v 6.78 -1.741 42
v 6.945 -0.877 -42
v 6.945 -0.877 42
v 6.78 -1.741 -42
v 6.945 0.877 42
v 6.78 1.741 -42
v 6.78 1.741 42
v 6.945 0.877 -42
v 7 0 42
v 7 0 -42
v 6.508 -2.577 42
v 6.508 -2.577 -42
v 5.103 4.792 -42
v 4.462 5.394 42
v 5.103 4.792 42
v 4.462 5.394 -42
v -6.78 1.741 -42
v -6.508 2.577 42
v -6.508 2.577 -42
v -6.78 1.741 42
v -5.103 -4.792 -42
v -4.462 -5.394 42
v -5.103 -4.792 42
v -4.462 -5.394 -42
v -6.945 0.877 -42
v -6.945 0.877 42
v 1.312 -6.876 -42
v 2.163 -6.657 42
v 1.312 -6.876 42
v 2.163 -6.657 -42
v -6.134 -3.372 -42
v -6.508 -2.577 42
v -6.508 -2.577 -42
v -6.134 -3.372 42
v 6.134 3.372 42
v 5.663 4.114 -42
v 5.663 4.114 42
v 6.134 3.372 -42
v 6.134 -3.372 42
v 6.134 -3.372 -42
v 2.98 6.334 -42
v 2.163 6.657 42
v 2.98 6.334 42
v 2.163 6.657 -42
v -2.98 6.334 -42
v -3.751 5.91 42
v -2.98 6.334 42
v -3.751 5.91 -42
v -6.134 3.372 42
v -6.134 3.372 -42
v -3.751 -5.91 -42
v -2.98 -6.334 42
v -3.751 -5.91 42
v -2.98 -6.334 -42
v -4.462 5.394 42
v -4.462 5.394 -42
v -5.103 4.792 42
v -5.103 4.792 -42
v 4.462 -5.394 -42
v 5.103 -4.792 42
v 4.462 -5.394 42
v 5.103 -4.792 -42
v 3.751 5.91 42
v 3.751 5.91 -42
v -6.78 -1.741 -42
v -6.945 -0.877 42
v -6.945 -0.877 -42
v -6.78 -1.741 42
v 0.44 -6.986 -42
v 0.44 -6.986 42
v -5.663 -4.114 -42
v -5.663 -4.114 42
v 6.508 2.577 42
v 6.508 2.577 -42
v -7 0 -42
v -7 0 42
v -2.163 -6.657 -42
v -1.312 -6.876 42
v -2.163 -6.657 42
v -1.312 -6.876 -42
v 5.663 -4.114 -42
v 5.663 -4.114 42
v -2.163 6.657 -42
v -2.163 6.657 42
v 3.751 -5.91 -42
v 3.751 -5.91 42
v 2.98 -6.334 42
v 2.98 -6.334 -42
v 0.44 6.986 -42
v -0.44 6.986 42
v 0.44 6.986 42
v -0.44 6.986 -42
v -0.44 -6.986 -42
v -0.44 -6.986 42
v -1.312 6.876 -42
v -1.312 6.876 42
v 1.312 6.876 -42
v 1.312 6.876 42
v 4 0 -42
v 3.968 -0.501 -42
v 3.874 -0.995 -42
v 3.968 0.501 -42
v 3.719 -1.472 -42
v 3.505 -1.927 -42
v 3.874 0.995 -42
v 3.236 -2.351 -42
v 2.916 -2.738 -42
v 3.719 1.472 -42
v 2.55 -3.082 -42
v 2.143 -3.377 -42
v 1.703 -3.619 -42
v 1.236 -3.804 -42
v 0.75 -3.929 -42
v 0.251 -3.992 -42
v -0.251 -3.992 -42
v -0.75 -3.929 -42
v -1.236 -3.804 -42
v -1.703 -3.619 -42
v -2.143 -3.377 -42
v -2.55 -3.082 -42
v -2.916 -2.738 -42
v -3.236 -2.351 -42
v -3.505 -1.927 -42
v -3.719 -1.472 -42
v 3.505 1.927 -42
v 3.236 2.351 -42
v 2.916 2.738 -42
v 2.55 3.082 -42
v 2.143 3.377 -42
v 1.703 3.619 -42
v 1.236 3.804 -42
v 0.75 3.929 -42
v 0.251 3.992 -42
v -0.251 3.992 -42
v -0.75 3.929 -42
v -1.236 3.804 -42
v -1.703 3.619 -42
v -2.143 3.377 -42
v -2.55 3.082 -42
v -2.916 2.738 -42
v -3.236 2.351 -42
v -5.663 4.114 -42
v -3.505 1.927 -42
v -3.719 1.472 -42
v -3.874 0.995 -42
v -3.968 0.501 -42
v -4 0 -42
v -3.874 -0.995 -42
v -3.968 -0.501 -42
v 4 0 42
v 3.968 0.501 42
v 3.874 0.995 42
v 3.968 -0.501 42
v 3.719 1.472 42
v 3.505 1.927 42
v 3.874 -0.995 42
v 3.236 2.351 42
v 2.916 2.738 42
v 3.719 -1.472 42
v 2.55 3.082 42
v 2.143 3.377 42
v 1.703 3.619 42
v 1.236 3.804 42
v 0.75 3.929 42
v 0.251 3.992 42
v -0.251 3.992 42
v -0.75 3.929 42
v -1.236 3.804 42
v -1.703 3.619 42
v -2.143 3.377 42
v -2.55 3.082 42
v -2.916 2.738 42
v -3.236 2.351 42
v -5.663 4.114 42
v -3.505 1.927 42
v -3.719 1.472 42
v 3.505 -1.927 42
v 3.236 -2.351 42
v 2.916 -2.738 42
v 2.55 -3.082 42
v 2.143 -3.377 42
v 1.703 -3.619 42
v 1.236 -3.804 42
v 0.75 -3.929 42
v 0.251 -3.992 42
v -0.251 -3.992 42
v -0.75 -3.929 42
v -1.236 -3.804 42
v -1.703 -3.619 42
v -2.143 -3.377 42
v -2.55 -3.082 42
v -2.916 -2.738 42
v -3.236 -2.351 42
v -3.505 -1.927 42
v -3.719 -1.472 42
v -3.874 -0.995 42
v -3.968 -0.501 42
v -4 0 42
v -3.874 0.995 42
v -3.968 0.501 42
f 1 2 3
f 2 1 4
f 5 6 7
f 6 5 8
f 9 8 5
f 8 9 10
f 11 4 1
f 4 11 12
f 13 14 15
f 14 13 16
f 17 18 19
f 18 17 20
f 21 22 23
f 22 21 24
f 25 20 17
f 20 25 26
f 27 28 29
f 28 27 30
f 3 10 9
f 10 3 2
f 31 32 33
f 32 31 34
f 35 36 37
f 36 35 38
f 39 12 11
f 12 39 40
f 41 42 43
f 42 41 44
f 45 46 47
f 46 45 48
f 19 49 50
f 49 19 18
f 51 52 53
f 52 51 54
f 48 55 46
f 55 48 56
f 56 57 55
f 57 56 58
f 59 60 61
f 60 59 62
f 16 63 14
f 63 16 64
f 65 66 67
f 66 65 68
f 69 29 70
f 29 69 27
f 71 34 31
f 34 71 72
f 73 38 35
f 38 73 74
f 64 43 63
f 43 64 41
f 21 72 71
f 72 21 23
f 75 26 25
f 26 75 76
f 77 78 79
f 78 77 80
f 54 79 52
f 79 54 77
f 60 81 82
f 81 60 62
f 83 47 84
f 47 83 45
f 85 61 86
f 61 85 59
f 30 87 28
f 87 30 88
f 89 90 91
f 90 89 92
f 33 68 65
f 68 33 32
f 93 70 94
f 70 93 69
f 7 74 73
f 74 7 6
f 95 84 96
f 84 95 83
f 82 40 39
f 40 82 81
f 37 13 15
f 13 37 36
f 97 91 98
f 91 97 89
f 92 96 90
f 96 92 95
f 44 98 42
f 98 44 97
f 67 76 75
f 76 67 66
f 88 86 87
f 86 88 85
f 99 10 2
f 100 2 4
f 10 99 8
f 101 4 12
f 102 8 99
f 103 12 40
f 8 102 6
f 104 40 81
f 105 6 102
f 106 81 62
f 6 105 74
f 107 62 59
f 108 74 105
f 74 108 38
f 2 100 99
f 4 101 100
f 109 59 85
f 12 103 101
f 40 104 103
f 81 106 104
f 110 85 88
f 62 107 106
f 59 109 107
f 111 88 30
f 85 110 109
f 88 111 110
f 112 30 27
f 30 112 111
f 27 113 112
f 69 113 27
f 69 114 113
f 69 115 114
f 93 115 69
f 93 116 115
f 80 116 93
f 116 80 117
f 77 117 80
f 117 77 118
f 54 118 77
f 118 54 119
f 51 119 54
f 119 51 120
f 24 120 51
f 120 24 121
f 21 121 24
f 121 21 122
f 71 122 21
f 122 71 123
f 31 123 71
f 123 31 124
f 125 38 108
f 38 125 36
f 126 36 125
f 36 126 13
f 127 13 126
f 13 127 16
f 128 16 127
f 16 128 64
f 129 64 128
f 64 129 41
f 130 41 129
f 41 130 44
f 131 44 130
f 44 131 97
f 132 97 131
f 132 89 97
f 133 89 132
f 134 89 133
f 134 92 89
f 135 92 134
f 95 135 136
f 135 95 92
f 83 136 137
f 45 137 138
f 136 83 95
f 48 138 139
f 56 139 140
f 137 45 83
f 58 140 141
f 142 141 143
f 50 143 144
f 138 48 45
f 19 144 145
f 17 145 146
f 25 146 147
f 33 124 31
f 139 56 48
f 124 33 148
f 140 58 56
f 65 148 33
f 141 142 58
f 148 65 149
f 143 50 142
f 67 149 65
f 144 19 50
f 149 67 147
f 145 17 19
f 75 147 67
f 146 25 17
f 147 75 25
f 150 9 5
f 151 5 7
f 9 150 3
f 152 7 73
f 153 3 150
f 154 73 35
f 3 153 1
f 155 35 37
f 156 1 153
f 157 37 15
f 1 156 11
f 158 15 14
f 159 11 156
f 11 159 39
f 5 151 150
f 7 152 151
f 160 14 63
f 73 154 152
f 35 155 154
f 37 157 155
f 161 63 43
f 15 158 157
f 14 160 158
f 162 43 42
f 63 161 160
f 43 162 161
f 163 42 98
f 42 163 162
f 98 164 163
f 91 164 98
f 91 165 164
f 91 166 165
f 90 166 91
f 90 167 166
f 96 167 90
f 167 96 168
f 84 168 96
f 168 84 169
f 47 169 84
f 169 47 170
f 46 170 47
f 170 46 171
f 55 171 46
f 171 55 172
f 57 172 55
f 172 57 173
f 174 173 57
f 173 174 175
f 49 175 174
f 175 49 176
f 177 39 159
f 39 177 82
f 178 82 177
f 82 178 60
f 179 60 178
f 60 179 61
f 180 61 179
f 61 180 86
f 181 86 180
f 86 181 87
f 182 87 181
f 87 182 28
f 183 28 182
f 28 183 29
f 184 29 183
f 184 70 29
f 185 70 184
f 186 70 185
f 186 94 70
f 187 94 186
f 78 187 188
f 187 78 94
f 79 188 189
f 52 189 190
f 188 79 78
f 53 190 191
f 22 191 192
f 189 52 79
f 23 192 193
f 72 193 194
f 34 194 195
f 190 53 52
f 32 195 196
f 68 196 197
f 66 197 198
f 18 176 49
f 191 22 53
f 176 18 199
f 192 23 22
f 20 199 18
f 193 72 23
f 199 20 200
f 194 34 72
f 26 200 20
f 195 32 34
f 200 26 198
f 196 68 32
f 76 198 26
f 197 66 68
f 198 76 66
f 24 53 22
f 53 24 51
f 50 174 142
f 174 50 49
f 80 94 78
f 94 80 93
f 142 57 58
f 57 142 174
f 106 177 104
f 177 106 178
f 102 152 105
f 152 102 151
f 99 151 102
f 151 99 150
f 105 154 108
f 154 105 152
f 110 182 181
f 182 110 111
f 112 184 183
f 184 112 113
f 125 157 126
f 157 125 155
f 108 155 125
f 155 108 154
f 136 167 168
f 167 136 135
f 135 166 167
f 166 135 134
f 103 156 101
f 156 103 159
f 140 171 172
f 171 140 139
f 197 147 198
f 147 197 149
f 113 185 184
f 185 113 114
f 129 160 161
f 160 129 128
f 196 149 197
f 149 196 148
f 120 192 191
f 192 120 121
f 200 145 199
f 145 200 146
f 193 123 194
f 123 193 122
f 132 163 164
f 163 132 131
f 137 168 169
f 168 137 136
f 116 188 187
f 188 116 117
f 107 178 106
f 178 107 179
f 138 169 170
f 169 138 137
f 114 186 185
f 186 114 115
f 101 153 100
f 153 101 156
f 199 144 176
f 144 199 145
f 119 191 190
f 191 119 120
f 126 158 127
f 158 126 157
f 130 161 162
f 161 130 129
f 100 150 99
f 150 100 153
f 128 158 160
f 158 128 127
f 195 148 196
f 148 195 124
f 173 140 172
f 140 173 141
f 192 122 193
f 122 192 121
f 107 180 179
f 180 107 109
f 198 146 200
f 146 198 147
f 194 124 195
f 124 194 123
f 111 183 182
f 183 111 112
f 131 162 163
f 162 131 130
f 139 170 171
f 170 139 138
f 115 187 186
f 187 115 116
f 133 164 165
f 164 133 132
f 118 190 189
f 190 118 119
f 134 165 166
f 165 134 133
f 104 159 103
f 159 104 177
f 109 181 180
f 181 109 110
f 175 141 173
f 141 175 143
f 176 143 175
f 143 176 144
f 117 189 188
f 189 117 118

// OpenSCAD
$fn = 50;


difference() {
	union() {
		translate(v = [0, 0, -42.0000000000]) {
			cylinder(h = 84, r = 7.0000000000);
		}
	}
	union() {
		translate(v = [0, 0, -100.0000000000]) {
			cylinder(h = 200, r = 4.0000000000);
		}
	}
}
